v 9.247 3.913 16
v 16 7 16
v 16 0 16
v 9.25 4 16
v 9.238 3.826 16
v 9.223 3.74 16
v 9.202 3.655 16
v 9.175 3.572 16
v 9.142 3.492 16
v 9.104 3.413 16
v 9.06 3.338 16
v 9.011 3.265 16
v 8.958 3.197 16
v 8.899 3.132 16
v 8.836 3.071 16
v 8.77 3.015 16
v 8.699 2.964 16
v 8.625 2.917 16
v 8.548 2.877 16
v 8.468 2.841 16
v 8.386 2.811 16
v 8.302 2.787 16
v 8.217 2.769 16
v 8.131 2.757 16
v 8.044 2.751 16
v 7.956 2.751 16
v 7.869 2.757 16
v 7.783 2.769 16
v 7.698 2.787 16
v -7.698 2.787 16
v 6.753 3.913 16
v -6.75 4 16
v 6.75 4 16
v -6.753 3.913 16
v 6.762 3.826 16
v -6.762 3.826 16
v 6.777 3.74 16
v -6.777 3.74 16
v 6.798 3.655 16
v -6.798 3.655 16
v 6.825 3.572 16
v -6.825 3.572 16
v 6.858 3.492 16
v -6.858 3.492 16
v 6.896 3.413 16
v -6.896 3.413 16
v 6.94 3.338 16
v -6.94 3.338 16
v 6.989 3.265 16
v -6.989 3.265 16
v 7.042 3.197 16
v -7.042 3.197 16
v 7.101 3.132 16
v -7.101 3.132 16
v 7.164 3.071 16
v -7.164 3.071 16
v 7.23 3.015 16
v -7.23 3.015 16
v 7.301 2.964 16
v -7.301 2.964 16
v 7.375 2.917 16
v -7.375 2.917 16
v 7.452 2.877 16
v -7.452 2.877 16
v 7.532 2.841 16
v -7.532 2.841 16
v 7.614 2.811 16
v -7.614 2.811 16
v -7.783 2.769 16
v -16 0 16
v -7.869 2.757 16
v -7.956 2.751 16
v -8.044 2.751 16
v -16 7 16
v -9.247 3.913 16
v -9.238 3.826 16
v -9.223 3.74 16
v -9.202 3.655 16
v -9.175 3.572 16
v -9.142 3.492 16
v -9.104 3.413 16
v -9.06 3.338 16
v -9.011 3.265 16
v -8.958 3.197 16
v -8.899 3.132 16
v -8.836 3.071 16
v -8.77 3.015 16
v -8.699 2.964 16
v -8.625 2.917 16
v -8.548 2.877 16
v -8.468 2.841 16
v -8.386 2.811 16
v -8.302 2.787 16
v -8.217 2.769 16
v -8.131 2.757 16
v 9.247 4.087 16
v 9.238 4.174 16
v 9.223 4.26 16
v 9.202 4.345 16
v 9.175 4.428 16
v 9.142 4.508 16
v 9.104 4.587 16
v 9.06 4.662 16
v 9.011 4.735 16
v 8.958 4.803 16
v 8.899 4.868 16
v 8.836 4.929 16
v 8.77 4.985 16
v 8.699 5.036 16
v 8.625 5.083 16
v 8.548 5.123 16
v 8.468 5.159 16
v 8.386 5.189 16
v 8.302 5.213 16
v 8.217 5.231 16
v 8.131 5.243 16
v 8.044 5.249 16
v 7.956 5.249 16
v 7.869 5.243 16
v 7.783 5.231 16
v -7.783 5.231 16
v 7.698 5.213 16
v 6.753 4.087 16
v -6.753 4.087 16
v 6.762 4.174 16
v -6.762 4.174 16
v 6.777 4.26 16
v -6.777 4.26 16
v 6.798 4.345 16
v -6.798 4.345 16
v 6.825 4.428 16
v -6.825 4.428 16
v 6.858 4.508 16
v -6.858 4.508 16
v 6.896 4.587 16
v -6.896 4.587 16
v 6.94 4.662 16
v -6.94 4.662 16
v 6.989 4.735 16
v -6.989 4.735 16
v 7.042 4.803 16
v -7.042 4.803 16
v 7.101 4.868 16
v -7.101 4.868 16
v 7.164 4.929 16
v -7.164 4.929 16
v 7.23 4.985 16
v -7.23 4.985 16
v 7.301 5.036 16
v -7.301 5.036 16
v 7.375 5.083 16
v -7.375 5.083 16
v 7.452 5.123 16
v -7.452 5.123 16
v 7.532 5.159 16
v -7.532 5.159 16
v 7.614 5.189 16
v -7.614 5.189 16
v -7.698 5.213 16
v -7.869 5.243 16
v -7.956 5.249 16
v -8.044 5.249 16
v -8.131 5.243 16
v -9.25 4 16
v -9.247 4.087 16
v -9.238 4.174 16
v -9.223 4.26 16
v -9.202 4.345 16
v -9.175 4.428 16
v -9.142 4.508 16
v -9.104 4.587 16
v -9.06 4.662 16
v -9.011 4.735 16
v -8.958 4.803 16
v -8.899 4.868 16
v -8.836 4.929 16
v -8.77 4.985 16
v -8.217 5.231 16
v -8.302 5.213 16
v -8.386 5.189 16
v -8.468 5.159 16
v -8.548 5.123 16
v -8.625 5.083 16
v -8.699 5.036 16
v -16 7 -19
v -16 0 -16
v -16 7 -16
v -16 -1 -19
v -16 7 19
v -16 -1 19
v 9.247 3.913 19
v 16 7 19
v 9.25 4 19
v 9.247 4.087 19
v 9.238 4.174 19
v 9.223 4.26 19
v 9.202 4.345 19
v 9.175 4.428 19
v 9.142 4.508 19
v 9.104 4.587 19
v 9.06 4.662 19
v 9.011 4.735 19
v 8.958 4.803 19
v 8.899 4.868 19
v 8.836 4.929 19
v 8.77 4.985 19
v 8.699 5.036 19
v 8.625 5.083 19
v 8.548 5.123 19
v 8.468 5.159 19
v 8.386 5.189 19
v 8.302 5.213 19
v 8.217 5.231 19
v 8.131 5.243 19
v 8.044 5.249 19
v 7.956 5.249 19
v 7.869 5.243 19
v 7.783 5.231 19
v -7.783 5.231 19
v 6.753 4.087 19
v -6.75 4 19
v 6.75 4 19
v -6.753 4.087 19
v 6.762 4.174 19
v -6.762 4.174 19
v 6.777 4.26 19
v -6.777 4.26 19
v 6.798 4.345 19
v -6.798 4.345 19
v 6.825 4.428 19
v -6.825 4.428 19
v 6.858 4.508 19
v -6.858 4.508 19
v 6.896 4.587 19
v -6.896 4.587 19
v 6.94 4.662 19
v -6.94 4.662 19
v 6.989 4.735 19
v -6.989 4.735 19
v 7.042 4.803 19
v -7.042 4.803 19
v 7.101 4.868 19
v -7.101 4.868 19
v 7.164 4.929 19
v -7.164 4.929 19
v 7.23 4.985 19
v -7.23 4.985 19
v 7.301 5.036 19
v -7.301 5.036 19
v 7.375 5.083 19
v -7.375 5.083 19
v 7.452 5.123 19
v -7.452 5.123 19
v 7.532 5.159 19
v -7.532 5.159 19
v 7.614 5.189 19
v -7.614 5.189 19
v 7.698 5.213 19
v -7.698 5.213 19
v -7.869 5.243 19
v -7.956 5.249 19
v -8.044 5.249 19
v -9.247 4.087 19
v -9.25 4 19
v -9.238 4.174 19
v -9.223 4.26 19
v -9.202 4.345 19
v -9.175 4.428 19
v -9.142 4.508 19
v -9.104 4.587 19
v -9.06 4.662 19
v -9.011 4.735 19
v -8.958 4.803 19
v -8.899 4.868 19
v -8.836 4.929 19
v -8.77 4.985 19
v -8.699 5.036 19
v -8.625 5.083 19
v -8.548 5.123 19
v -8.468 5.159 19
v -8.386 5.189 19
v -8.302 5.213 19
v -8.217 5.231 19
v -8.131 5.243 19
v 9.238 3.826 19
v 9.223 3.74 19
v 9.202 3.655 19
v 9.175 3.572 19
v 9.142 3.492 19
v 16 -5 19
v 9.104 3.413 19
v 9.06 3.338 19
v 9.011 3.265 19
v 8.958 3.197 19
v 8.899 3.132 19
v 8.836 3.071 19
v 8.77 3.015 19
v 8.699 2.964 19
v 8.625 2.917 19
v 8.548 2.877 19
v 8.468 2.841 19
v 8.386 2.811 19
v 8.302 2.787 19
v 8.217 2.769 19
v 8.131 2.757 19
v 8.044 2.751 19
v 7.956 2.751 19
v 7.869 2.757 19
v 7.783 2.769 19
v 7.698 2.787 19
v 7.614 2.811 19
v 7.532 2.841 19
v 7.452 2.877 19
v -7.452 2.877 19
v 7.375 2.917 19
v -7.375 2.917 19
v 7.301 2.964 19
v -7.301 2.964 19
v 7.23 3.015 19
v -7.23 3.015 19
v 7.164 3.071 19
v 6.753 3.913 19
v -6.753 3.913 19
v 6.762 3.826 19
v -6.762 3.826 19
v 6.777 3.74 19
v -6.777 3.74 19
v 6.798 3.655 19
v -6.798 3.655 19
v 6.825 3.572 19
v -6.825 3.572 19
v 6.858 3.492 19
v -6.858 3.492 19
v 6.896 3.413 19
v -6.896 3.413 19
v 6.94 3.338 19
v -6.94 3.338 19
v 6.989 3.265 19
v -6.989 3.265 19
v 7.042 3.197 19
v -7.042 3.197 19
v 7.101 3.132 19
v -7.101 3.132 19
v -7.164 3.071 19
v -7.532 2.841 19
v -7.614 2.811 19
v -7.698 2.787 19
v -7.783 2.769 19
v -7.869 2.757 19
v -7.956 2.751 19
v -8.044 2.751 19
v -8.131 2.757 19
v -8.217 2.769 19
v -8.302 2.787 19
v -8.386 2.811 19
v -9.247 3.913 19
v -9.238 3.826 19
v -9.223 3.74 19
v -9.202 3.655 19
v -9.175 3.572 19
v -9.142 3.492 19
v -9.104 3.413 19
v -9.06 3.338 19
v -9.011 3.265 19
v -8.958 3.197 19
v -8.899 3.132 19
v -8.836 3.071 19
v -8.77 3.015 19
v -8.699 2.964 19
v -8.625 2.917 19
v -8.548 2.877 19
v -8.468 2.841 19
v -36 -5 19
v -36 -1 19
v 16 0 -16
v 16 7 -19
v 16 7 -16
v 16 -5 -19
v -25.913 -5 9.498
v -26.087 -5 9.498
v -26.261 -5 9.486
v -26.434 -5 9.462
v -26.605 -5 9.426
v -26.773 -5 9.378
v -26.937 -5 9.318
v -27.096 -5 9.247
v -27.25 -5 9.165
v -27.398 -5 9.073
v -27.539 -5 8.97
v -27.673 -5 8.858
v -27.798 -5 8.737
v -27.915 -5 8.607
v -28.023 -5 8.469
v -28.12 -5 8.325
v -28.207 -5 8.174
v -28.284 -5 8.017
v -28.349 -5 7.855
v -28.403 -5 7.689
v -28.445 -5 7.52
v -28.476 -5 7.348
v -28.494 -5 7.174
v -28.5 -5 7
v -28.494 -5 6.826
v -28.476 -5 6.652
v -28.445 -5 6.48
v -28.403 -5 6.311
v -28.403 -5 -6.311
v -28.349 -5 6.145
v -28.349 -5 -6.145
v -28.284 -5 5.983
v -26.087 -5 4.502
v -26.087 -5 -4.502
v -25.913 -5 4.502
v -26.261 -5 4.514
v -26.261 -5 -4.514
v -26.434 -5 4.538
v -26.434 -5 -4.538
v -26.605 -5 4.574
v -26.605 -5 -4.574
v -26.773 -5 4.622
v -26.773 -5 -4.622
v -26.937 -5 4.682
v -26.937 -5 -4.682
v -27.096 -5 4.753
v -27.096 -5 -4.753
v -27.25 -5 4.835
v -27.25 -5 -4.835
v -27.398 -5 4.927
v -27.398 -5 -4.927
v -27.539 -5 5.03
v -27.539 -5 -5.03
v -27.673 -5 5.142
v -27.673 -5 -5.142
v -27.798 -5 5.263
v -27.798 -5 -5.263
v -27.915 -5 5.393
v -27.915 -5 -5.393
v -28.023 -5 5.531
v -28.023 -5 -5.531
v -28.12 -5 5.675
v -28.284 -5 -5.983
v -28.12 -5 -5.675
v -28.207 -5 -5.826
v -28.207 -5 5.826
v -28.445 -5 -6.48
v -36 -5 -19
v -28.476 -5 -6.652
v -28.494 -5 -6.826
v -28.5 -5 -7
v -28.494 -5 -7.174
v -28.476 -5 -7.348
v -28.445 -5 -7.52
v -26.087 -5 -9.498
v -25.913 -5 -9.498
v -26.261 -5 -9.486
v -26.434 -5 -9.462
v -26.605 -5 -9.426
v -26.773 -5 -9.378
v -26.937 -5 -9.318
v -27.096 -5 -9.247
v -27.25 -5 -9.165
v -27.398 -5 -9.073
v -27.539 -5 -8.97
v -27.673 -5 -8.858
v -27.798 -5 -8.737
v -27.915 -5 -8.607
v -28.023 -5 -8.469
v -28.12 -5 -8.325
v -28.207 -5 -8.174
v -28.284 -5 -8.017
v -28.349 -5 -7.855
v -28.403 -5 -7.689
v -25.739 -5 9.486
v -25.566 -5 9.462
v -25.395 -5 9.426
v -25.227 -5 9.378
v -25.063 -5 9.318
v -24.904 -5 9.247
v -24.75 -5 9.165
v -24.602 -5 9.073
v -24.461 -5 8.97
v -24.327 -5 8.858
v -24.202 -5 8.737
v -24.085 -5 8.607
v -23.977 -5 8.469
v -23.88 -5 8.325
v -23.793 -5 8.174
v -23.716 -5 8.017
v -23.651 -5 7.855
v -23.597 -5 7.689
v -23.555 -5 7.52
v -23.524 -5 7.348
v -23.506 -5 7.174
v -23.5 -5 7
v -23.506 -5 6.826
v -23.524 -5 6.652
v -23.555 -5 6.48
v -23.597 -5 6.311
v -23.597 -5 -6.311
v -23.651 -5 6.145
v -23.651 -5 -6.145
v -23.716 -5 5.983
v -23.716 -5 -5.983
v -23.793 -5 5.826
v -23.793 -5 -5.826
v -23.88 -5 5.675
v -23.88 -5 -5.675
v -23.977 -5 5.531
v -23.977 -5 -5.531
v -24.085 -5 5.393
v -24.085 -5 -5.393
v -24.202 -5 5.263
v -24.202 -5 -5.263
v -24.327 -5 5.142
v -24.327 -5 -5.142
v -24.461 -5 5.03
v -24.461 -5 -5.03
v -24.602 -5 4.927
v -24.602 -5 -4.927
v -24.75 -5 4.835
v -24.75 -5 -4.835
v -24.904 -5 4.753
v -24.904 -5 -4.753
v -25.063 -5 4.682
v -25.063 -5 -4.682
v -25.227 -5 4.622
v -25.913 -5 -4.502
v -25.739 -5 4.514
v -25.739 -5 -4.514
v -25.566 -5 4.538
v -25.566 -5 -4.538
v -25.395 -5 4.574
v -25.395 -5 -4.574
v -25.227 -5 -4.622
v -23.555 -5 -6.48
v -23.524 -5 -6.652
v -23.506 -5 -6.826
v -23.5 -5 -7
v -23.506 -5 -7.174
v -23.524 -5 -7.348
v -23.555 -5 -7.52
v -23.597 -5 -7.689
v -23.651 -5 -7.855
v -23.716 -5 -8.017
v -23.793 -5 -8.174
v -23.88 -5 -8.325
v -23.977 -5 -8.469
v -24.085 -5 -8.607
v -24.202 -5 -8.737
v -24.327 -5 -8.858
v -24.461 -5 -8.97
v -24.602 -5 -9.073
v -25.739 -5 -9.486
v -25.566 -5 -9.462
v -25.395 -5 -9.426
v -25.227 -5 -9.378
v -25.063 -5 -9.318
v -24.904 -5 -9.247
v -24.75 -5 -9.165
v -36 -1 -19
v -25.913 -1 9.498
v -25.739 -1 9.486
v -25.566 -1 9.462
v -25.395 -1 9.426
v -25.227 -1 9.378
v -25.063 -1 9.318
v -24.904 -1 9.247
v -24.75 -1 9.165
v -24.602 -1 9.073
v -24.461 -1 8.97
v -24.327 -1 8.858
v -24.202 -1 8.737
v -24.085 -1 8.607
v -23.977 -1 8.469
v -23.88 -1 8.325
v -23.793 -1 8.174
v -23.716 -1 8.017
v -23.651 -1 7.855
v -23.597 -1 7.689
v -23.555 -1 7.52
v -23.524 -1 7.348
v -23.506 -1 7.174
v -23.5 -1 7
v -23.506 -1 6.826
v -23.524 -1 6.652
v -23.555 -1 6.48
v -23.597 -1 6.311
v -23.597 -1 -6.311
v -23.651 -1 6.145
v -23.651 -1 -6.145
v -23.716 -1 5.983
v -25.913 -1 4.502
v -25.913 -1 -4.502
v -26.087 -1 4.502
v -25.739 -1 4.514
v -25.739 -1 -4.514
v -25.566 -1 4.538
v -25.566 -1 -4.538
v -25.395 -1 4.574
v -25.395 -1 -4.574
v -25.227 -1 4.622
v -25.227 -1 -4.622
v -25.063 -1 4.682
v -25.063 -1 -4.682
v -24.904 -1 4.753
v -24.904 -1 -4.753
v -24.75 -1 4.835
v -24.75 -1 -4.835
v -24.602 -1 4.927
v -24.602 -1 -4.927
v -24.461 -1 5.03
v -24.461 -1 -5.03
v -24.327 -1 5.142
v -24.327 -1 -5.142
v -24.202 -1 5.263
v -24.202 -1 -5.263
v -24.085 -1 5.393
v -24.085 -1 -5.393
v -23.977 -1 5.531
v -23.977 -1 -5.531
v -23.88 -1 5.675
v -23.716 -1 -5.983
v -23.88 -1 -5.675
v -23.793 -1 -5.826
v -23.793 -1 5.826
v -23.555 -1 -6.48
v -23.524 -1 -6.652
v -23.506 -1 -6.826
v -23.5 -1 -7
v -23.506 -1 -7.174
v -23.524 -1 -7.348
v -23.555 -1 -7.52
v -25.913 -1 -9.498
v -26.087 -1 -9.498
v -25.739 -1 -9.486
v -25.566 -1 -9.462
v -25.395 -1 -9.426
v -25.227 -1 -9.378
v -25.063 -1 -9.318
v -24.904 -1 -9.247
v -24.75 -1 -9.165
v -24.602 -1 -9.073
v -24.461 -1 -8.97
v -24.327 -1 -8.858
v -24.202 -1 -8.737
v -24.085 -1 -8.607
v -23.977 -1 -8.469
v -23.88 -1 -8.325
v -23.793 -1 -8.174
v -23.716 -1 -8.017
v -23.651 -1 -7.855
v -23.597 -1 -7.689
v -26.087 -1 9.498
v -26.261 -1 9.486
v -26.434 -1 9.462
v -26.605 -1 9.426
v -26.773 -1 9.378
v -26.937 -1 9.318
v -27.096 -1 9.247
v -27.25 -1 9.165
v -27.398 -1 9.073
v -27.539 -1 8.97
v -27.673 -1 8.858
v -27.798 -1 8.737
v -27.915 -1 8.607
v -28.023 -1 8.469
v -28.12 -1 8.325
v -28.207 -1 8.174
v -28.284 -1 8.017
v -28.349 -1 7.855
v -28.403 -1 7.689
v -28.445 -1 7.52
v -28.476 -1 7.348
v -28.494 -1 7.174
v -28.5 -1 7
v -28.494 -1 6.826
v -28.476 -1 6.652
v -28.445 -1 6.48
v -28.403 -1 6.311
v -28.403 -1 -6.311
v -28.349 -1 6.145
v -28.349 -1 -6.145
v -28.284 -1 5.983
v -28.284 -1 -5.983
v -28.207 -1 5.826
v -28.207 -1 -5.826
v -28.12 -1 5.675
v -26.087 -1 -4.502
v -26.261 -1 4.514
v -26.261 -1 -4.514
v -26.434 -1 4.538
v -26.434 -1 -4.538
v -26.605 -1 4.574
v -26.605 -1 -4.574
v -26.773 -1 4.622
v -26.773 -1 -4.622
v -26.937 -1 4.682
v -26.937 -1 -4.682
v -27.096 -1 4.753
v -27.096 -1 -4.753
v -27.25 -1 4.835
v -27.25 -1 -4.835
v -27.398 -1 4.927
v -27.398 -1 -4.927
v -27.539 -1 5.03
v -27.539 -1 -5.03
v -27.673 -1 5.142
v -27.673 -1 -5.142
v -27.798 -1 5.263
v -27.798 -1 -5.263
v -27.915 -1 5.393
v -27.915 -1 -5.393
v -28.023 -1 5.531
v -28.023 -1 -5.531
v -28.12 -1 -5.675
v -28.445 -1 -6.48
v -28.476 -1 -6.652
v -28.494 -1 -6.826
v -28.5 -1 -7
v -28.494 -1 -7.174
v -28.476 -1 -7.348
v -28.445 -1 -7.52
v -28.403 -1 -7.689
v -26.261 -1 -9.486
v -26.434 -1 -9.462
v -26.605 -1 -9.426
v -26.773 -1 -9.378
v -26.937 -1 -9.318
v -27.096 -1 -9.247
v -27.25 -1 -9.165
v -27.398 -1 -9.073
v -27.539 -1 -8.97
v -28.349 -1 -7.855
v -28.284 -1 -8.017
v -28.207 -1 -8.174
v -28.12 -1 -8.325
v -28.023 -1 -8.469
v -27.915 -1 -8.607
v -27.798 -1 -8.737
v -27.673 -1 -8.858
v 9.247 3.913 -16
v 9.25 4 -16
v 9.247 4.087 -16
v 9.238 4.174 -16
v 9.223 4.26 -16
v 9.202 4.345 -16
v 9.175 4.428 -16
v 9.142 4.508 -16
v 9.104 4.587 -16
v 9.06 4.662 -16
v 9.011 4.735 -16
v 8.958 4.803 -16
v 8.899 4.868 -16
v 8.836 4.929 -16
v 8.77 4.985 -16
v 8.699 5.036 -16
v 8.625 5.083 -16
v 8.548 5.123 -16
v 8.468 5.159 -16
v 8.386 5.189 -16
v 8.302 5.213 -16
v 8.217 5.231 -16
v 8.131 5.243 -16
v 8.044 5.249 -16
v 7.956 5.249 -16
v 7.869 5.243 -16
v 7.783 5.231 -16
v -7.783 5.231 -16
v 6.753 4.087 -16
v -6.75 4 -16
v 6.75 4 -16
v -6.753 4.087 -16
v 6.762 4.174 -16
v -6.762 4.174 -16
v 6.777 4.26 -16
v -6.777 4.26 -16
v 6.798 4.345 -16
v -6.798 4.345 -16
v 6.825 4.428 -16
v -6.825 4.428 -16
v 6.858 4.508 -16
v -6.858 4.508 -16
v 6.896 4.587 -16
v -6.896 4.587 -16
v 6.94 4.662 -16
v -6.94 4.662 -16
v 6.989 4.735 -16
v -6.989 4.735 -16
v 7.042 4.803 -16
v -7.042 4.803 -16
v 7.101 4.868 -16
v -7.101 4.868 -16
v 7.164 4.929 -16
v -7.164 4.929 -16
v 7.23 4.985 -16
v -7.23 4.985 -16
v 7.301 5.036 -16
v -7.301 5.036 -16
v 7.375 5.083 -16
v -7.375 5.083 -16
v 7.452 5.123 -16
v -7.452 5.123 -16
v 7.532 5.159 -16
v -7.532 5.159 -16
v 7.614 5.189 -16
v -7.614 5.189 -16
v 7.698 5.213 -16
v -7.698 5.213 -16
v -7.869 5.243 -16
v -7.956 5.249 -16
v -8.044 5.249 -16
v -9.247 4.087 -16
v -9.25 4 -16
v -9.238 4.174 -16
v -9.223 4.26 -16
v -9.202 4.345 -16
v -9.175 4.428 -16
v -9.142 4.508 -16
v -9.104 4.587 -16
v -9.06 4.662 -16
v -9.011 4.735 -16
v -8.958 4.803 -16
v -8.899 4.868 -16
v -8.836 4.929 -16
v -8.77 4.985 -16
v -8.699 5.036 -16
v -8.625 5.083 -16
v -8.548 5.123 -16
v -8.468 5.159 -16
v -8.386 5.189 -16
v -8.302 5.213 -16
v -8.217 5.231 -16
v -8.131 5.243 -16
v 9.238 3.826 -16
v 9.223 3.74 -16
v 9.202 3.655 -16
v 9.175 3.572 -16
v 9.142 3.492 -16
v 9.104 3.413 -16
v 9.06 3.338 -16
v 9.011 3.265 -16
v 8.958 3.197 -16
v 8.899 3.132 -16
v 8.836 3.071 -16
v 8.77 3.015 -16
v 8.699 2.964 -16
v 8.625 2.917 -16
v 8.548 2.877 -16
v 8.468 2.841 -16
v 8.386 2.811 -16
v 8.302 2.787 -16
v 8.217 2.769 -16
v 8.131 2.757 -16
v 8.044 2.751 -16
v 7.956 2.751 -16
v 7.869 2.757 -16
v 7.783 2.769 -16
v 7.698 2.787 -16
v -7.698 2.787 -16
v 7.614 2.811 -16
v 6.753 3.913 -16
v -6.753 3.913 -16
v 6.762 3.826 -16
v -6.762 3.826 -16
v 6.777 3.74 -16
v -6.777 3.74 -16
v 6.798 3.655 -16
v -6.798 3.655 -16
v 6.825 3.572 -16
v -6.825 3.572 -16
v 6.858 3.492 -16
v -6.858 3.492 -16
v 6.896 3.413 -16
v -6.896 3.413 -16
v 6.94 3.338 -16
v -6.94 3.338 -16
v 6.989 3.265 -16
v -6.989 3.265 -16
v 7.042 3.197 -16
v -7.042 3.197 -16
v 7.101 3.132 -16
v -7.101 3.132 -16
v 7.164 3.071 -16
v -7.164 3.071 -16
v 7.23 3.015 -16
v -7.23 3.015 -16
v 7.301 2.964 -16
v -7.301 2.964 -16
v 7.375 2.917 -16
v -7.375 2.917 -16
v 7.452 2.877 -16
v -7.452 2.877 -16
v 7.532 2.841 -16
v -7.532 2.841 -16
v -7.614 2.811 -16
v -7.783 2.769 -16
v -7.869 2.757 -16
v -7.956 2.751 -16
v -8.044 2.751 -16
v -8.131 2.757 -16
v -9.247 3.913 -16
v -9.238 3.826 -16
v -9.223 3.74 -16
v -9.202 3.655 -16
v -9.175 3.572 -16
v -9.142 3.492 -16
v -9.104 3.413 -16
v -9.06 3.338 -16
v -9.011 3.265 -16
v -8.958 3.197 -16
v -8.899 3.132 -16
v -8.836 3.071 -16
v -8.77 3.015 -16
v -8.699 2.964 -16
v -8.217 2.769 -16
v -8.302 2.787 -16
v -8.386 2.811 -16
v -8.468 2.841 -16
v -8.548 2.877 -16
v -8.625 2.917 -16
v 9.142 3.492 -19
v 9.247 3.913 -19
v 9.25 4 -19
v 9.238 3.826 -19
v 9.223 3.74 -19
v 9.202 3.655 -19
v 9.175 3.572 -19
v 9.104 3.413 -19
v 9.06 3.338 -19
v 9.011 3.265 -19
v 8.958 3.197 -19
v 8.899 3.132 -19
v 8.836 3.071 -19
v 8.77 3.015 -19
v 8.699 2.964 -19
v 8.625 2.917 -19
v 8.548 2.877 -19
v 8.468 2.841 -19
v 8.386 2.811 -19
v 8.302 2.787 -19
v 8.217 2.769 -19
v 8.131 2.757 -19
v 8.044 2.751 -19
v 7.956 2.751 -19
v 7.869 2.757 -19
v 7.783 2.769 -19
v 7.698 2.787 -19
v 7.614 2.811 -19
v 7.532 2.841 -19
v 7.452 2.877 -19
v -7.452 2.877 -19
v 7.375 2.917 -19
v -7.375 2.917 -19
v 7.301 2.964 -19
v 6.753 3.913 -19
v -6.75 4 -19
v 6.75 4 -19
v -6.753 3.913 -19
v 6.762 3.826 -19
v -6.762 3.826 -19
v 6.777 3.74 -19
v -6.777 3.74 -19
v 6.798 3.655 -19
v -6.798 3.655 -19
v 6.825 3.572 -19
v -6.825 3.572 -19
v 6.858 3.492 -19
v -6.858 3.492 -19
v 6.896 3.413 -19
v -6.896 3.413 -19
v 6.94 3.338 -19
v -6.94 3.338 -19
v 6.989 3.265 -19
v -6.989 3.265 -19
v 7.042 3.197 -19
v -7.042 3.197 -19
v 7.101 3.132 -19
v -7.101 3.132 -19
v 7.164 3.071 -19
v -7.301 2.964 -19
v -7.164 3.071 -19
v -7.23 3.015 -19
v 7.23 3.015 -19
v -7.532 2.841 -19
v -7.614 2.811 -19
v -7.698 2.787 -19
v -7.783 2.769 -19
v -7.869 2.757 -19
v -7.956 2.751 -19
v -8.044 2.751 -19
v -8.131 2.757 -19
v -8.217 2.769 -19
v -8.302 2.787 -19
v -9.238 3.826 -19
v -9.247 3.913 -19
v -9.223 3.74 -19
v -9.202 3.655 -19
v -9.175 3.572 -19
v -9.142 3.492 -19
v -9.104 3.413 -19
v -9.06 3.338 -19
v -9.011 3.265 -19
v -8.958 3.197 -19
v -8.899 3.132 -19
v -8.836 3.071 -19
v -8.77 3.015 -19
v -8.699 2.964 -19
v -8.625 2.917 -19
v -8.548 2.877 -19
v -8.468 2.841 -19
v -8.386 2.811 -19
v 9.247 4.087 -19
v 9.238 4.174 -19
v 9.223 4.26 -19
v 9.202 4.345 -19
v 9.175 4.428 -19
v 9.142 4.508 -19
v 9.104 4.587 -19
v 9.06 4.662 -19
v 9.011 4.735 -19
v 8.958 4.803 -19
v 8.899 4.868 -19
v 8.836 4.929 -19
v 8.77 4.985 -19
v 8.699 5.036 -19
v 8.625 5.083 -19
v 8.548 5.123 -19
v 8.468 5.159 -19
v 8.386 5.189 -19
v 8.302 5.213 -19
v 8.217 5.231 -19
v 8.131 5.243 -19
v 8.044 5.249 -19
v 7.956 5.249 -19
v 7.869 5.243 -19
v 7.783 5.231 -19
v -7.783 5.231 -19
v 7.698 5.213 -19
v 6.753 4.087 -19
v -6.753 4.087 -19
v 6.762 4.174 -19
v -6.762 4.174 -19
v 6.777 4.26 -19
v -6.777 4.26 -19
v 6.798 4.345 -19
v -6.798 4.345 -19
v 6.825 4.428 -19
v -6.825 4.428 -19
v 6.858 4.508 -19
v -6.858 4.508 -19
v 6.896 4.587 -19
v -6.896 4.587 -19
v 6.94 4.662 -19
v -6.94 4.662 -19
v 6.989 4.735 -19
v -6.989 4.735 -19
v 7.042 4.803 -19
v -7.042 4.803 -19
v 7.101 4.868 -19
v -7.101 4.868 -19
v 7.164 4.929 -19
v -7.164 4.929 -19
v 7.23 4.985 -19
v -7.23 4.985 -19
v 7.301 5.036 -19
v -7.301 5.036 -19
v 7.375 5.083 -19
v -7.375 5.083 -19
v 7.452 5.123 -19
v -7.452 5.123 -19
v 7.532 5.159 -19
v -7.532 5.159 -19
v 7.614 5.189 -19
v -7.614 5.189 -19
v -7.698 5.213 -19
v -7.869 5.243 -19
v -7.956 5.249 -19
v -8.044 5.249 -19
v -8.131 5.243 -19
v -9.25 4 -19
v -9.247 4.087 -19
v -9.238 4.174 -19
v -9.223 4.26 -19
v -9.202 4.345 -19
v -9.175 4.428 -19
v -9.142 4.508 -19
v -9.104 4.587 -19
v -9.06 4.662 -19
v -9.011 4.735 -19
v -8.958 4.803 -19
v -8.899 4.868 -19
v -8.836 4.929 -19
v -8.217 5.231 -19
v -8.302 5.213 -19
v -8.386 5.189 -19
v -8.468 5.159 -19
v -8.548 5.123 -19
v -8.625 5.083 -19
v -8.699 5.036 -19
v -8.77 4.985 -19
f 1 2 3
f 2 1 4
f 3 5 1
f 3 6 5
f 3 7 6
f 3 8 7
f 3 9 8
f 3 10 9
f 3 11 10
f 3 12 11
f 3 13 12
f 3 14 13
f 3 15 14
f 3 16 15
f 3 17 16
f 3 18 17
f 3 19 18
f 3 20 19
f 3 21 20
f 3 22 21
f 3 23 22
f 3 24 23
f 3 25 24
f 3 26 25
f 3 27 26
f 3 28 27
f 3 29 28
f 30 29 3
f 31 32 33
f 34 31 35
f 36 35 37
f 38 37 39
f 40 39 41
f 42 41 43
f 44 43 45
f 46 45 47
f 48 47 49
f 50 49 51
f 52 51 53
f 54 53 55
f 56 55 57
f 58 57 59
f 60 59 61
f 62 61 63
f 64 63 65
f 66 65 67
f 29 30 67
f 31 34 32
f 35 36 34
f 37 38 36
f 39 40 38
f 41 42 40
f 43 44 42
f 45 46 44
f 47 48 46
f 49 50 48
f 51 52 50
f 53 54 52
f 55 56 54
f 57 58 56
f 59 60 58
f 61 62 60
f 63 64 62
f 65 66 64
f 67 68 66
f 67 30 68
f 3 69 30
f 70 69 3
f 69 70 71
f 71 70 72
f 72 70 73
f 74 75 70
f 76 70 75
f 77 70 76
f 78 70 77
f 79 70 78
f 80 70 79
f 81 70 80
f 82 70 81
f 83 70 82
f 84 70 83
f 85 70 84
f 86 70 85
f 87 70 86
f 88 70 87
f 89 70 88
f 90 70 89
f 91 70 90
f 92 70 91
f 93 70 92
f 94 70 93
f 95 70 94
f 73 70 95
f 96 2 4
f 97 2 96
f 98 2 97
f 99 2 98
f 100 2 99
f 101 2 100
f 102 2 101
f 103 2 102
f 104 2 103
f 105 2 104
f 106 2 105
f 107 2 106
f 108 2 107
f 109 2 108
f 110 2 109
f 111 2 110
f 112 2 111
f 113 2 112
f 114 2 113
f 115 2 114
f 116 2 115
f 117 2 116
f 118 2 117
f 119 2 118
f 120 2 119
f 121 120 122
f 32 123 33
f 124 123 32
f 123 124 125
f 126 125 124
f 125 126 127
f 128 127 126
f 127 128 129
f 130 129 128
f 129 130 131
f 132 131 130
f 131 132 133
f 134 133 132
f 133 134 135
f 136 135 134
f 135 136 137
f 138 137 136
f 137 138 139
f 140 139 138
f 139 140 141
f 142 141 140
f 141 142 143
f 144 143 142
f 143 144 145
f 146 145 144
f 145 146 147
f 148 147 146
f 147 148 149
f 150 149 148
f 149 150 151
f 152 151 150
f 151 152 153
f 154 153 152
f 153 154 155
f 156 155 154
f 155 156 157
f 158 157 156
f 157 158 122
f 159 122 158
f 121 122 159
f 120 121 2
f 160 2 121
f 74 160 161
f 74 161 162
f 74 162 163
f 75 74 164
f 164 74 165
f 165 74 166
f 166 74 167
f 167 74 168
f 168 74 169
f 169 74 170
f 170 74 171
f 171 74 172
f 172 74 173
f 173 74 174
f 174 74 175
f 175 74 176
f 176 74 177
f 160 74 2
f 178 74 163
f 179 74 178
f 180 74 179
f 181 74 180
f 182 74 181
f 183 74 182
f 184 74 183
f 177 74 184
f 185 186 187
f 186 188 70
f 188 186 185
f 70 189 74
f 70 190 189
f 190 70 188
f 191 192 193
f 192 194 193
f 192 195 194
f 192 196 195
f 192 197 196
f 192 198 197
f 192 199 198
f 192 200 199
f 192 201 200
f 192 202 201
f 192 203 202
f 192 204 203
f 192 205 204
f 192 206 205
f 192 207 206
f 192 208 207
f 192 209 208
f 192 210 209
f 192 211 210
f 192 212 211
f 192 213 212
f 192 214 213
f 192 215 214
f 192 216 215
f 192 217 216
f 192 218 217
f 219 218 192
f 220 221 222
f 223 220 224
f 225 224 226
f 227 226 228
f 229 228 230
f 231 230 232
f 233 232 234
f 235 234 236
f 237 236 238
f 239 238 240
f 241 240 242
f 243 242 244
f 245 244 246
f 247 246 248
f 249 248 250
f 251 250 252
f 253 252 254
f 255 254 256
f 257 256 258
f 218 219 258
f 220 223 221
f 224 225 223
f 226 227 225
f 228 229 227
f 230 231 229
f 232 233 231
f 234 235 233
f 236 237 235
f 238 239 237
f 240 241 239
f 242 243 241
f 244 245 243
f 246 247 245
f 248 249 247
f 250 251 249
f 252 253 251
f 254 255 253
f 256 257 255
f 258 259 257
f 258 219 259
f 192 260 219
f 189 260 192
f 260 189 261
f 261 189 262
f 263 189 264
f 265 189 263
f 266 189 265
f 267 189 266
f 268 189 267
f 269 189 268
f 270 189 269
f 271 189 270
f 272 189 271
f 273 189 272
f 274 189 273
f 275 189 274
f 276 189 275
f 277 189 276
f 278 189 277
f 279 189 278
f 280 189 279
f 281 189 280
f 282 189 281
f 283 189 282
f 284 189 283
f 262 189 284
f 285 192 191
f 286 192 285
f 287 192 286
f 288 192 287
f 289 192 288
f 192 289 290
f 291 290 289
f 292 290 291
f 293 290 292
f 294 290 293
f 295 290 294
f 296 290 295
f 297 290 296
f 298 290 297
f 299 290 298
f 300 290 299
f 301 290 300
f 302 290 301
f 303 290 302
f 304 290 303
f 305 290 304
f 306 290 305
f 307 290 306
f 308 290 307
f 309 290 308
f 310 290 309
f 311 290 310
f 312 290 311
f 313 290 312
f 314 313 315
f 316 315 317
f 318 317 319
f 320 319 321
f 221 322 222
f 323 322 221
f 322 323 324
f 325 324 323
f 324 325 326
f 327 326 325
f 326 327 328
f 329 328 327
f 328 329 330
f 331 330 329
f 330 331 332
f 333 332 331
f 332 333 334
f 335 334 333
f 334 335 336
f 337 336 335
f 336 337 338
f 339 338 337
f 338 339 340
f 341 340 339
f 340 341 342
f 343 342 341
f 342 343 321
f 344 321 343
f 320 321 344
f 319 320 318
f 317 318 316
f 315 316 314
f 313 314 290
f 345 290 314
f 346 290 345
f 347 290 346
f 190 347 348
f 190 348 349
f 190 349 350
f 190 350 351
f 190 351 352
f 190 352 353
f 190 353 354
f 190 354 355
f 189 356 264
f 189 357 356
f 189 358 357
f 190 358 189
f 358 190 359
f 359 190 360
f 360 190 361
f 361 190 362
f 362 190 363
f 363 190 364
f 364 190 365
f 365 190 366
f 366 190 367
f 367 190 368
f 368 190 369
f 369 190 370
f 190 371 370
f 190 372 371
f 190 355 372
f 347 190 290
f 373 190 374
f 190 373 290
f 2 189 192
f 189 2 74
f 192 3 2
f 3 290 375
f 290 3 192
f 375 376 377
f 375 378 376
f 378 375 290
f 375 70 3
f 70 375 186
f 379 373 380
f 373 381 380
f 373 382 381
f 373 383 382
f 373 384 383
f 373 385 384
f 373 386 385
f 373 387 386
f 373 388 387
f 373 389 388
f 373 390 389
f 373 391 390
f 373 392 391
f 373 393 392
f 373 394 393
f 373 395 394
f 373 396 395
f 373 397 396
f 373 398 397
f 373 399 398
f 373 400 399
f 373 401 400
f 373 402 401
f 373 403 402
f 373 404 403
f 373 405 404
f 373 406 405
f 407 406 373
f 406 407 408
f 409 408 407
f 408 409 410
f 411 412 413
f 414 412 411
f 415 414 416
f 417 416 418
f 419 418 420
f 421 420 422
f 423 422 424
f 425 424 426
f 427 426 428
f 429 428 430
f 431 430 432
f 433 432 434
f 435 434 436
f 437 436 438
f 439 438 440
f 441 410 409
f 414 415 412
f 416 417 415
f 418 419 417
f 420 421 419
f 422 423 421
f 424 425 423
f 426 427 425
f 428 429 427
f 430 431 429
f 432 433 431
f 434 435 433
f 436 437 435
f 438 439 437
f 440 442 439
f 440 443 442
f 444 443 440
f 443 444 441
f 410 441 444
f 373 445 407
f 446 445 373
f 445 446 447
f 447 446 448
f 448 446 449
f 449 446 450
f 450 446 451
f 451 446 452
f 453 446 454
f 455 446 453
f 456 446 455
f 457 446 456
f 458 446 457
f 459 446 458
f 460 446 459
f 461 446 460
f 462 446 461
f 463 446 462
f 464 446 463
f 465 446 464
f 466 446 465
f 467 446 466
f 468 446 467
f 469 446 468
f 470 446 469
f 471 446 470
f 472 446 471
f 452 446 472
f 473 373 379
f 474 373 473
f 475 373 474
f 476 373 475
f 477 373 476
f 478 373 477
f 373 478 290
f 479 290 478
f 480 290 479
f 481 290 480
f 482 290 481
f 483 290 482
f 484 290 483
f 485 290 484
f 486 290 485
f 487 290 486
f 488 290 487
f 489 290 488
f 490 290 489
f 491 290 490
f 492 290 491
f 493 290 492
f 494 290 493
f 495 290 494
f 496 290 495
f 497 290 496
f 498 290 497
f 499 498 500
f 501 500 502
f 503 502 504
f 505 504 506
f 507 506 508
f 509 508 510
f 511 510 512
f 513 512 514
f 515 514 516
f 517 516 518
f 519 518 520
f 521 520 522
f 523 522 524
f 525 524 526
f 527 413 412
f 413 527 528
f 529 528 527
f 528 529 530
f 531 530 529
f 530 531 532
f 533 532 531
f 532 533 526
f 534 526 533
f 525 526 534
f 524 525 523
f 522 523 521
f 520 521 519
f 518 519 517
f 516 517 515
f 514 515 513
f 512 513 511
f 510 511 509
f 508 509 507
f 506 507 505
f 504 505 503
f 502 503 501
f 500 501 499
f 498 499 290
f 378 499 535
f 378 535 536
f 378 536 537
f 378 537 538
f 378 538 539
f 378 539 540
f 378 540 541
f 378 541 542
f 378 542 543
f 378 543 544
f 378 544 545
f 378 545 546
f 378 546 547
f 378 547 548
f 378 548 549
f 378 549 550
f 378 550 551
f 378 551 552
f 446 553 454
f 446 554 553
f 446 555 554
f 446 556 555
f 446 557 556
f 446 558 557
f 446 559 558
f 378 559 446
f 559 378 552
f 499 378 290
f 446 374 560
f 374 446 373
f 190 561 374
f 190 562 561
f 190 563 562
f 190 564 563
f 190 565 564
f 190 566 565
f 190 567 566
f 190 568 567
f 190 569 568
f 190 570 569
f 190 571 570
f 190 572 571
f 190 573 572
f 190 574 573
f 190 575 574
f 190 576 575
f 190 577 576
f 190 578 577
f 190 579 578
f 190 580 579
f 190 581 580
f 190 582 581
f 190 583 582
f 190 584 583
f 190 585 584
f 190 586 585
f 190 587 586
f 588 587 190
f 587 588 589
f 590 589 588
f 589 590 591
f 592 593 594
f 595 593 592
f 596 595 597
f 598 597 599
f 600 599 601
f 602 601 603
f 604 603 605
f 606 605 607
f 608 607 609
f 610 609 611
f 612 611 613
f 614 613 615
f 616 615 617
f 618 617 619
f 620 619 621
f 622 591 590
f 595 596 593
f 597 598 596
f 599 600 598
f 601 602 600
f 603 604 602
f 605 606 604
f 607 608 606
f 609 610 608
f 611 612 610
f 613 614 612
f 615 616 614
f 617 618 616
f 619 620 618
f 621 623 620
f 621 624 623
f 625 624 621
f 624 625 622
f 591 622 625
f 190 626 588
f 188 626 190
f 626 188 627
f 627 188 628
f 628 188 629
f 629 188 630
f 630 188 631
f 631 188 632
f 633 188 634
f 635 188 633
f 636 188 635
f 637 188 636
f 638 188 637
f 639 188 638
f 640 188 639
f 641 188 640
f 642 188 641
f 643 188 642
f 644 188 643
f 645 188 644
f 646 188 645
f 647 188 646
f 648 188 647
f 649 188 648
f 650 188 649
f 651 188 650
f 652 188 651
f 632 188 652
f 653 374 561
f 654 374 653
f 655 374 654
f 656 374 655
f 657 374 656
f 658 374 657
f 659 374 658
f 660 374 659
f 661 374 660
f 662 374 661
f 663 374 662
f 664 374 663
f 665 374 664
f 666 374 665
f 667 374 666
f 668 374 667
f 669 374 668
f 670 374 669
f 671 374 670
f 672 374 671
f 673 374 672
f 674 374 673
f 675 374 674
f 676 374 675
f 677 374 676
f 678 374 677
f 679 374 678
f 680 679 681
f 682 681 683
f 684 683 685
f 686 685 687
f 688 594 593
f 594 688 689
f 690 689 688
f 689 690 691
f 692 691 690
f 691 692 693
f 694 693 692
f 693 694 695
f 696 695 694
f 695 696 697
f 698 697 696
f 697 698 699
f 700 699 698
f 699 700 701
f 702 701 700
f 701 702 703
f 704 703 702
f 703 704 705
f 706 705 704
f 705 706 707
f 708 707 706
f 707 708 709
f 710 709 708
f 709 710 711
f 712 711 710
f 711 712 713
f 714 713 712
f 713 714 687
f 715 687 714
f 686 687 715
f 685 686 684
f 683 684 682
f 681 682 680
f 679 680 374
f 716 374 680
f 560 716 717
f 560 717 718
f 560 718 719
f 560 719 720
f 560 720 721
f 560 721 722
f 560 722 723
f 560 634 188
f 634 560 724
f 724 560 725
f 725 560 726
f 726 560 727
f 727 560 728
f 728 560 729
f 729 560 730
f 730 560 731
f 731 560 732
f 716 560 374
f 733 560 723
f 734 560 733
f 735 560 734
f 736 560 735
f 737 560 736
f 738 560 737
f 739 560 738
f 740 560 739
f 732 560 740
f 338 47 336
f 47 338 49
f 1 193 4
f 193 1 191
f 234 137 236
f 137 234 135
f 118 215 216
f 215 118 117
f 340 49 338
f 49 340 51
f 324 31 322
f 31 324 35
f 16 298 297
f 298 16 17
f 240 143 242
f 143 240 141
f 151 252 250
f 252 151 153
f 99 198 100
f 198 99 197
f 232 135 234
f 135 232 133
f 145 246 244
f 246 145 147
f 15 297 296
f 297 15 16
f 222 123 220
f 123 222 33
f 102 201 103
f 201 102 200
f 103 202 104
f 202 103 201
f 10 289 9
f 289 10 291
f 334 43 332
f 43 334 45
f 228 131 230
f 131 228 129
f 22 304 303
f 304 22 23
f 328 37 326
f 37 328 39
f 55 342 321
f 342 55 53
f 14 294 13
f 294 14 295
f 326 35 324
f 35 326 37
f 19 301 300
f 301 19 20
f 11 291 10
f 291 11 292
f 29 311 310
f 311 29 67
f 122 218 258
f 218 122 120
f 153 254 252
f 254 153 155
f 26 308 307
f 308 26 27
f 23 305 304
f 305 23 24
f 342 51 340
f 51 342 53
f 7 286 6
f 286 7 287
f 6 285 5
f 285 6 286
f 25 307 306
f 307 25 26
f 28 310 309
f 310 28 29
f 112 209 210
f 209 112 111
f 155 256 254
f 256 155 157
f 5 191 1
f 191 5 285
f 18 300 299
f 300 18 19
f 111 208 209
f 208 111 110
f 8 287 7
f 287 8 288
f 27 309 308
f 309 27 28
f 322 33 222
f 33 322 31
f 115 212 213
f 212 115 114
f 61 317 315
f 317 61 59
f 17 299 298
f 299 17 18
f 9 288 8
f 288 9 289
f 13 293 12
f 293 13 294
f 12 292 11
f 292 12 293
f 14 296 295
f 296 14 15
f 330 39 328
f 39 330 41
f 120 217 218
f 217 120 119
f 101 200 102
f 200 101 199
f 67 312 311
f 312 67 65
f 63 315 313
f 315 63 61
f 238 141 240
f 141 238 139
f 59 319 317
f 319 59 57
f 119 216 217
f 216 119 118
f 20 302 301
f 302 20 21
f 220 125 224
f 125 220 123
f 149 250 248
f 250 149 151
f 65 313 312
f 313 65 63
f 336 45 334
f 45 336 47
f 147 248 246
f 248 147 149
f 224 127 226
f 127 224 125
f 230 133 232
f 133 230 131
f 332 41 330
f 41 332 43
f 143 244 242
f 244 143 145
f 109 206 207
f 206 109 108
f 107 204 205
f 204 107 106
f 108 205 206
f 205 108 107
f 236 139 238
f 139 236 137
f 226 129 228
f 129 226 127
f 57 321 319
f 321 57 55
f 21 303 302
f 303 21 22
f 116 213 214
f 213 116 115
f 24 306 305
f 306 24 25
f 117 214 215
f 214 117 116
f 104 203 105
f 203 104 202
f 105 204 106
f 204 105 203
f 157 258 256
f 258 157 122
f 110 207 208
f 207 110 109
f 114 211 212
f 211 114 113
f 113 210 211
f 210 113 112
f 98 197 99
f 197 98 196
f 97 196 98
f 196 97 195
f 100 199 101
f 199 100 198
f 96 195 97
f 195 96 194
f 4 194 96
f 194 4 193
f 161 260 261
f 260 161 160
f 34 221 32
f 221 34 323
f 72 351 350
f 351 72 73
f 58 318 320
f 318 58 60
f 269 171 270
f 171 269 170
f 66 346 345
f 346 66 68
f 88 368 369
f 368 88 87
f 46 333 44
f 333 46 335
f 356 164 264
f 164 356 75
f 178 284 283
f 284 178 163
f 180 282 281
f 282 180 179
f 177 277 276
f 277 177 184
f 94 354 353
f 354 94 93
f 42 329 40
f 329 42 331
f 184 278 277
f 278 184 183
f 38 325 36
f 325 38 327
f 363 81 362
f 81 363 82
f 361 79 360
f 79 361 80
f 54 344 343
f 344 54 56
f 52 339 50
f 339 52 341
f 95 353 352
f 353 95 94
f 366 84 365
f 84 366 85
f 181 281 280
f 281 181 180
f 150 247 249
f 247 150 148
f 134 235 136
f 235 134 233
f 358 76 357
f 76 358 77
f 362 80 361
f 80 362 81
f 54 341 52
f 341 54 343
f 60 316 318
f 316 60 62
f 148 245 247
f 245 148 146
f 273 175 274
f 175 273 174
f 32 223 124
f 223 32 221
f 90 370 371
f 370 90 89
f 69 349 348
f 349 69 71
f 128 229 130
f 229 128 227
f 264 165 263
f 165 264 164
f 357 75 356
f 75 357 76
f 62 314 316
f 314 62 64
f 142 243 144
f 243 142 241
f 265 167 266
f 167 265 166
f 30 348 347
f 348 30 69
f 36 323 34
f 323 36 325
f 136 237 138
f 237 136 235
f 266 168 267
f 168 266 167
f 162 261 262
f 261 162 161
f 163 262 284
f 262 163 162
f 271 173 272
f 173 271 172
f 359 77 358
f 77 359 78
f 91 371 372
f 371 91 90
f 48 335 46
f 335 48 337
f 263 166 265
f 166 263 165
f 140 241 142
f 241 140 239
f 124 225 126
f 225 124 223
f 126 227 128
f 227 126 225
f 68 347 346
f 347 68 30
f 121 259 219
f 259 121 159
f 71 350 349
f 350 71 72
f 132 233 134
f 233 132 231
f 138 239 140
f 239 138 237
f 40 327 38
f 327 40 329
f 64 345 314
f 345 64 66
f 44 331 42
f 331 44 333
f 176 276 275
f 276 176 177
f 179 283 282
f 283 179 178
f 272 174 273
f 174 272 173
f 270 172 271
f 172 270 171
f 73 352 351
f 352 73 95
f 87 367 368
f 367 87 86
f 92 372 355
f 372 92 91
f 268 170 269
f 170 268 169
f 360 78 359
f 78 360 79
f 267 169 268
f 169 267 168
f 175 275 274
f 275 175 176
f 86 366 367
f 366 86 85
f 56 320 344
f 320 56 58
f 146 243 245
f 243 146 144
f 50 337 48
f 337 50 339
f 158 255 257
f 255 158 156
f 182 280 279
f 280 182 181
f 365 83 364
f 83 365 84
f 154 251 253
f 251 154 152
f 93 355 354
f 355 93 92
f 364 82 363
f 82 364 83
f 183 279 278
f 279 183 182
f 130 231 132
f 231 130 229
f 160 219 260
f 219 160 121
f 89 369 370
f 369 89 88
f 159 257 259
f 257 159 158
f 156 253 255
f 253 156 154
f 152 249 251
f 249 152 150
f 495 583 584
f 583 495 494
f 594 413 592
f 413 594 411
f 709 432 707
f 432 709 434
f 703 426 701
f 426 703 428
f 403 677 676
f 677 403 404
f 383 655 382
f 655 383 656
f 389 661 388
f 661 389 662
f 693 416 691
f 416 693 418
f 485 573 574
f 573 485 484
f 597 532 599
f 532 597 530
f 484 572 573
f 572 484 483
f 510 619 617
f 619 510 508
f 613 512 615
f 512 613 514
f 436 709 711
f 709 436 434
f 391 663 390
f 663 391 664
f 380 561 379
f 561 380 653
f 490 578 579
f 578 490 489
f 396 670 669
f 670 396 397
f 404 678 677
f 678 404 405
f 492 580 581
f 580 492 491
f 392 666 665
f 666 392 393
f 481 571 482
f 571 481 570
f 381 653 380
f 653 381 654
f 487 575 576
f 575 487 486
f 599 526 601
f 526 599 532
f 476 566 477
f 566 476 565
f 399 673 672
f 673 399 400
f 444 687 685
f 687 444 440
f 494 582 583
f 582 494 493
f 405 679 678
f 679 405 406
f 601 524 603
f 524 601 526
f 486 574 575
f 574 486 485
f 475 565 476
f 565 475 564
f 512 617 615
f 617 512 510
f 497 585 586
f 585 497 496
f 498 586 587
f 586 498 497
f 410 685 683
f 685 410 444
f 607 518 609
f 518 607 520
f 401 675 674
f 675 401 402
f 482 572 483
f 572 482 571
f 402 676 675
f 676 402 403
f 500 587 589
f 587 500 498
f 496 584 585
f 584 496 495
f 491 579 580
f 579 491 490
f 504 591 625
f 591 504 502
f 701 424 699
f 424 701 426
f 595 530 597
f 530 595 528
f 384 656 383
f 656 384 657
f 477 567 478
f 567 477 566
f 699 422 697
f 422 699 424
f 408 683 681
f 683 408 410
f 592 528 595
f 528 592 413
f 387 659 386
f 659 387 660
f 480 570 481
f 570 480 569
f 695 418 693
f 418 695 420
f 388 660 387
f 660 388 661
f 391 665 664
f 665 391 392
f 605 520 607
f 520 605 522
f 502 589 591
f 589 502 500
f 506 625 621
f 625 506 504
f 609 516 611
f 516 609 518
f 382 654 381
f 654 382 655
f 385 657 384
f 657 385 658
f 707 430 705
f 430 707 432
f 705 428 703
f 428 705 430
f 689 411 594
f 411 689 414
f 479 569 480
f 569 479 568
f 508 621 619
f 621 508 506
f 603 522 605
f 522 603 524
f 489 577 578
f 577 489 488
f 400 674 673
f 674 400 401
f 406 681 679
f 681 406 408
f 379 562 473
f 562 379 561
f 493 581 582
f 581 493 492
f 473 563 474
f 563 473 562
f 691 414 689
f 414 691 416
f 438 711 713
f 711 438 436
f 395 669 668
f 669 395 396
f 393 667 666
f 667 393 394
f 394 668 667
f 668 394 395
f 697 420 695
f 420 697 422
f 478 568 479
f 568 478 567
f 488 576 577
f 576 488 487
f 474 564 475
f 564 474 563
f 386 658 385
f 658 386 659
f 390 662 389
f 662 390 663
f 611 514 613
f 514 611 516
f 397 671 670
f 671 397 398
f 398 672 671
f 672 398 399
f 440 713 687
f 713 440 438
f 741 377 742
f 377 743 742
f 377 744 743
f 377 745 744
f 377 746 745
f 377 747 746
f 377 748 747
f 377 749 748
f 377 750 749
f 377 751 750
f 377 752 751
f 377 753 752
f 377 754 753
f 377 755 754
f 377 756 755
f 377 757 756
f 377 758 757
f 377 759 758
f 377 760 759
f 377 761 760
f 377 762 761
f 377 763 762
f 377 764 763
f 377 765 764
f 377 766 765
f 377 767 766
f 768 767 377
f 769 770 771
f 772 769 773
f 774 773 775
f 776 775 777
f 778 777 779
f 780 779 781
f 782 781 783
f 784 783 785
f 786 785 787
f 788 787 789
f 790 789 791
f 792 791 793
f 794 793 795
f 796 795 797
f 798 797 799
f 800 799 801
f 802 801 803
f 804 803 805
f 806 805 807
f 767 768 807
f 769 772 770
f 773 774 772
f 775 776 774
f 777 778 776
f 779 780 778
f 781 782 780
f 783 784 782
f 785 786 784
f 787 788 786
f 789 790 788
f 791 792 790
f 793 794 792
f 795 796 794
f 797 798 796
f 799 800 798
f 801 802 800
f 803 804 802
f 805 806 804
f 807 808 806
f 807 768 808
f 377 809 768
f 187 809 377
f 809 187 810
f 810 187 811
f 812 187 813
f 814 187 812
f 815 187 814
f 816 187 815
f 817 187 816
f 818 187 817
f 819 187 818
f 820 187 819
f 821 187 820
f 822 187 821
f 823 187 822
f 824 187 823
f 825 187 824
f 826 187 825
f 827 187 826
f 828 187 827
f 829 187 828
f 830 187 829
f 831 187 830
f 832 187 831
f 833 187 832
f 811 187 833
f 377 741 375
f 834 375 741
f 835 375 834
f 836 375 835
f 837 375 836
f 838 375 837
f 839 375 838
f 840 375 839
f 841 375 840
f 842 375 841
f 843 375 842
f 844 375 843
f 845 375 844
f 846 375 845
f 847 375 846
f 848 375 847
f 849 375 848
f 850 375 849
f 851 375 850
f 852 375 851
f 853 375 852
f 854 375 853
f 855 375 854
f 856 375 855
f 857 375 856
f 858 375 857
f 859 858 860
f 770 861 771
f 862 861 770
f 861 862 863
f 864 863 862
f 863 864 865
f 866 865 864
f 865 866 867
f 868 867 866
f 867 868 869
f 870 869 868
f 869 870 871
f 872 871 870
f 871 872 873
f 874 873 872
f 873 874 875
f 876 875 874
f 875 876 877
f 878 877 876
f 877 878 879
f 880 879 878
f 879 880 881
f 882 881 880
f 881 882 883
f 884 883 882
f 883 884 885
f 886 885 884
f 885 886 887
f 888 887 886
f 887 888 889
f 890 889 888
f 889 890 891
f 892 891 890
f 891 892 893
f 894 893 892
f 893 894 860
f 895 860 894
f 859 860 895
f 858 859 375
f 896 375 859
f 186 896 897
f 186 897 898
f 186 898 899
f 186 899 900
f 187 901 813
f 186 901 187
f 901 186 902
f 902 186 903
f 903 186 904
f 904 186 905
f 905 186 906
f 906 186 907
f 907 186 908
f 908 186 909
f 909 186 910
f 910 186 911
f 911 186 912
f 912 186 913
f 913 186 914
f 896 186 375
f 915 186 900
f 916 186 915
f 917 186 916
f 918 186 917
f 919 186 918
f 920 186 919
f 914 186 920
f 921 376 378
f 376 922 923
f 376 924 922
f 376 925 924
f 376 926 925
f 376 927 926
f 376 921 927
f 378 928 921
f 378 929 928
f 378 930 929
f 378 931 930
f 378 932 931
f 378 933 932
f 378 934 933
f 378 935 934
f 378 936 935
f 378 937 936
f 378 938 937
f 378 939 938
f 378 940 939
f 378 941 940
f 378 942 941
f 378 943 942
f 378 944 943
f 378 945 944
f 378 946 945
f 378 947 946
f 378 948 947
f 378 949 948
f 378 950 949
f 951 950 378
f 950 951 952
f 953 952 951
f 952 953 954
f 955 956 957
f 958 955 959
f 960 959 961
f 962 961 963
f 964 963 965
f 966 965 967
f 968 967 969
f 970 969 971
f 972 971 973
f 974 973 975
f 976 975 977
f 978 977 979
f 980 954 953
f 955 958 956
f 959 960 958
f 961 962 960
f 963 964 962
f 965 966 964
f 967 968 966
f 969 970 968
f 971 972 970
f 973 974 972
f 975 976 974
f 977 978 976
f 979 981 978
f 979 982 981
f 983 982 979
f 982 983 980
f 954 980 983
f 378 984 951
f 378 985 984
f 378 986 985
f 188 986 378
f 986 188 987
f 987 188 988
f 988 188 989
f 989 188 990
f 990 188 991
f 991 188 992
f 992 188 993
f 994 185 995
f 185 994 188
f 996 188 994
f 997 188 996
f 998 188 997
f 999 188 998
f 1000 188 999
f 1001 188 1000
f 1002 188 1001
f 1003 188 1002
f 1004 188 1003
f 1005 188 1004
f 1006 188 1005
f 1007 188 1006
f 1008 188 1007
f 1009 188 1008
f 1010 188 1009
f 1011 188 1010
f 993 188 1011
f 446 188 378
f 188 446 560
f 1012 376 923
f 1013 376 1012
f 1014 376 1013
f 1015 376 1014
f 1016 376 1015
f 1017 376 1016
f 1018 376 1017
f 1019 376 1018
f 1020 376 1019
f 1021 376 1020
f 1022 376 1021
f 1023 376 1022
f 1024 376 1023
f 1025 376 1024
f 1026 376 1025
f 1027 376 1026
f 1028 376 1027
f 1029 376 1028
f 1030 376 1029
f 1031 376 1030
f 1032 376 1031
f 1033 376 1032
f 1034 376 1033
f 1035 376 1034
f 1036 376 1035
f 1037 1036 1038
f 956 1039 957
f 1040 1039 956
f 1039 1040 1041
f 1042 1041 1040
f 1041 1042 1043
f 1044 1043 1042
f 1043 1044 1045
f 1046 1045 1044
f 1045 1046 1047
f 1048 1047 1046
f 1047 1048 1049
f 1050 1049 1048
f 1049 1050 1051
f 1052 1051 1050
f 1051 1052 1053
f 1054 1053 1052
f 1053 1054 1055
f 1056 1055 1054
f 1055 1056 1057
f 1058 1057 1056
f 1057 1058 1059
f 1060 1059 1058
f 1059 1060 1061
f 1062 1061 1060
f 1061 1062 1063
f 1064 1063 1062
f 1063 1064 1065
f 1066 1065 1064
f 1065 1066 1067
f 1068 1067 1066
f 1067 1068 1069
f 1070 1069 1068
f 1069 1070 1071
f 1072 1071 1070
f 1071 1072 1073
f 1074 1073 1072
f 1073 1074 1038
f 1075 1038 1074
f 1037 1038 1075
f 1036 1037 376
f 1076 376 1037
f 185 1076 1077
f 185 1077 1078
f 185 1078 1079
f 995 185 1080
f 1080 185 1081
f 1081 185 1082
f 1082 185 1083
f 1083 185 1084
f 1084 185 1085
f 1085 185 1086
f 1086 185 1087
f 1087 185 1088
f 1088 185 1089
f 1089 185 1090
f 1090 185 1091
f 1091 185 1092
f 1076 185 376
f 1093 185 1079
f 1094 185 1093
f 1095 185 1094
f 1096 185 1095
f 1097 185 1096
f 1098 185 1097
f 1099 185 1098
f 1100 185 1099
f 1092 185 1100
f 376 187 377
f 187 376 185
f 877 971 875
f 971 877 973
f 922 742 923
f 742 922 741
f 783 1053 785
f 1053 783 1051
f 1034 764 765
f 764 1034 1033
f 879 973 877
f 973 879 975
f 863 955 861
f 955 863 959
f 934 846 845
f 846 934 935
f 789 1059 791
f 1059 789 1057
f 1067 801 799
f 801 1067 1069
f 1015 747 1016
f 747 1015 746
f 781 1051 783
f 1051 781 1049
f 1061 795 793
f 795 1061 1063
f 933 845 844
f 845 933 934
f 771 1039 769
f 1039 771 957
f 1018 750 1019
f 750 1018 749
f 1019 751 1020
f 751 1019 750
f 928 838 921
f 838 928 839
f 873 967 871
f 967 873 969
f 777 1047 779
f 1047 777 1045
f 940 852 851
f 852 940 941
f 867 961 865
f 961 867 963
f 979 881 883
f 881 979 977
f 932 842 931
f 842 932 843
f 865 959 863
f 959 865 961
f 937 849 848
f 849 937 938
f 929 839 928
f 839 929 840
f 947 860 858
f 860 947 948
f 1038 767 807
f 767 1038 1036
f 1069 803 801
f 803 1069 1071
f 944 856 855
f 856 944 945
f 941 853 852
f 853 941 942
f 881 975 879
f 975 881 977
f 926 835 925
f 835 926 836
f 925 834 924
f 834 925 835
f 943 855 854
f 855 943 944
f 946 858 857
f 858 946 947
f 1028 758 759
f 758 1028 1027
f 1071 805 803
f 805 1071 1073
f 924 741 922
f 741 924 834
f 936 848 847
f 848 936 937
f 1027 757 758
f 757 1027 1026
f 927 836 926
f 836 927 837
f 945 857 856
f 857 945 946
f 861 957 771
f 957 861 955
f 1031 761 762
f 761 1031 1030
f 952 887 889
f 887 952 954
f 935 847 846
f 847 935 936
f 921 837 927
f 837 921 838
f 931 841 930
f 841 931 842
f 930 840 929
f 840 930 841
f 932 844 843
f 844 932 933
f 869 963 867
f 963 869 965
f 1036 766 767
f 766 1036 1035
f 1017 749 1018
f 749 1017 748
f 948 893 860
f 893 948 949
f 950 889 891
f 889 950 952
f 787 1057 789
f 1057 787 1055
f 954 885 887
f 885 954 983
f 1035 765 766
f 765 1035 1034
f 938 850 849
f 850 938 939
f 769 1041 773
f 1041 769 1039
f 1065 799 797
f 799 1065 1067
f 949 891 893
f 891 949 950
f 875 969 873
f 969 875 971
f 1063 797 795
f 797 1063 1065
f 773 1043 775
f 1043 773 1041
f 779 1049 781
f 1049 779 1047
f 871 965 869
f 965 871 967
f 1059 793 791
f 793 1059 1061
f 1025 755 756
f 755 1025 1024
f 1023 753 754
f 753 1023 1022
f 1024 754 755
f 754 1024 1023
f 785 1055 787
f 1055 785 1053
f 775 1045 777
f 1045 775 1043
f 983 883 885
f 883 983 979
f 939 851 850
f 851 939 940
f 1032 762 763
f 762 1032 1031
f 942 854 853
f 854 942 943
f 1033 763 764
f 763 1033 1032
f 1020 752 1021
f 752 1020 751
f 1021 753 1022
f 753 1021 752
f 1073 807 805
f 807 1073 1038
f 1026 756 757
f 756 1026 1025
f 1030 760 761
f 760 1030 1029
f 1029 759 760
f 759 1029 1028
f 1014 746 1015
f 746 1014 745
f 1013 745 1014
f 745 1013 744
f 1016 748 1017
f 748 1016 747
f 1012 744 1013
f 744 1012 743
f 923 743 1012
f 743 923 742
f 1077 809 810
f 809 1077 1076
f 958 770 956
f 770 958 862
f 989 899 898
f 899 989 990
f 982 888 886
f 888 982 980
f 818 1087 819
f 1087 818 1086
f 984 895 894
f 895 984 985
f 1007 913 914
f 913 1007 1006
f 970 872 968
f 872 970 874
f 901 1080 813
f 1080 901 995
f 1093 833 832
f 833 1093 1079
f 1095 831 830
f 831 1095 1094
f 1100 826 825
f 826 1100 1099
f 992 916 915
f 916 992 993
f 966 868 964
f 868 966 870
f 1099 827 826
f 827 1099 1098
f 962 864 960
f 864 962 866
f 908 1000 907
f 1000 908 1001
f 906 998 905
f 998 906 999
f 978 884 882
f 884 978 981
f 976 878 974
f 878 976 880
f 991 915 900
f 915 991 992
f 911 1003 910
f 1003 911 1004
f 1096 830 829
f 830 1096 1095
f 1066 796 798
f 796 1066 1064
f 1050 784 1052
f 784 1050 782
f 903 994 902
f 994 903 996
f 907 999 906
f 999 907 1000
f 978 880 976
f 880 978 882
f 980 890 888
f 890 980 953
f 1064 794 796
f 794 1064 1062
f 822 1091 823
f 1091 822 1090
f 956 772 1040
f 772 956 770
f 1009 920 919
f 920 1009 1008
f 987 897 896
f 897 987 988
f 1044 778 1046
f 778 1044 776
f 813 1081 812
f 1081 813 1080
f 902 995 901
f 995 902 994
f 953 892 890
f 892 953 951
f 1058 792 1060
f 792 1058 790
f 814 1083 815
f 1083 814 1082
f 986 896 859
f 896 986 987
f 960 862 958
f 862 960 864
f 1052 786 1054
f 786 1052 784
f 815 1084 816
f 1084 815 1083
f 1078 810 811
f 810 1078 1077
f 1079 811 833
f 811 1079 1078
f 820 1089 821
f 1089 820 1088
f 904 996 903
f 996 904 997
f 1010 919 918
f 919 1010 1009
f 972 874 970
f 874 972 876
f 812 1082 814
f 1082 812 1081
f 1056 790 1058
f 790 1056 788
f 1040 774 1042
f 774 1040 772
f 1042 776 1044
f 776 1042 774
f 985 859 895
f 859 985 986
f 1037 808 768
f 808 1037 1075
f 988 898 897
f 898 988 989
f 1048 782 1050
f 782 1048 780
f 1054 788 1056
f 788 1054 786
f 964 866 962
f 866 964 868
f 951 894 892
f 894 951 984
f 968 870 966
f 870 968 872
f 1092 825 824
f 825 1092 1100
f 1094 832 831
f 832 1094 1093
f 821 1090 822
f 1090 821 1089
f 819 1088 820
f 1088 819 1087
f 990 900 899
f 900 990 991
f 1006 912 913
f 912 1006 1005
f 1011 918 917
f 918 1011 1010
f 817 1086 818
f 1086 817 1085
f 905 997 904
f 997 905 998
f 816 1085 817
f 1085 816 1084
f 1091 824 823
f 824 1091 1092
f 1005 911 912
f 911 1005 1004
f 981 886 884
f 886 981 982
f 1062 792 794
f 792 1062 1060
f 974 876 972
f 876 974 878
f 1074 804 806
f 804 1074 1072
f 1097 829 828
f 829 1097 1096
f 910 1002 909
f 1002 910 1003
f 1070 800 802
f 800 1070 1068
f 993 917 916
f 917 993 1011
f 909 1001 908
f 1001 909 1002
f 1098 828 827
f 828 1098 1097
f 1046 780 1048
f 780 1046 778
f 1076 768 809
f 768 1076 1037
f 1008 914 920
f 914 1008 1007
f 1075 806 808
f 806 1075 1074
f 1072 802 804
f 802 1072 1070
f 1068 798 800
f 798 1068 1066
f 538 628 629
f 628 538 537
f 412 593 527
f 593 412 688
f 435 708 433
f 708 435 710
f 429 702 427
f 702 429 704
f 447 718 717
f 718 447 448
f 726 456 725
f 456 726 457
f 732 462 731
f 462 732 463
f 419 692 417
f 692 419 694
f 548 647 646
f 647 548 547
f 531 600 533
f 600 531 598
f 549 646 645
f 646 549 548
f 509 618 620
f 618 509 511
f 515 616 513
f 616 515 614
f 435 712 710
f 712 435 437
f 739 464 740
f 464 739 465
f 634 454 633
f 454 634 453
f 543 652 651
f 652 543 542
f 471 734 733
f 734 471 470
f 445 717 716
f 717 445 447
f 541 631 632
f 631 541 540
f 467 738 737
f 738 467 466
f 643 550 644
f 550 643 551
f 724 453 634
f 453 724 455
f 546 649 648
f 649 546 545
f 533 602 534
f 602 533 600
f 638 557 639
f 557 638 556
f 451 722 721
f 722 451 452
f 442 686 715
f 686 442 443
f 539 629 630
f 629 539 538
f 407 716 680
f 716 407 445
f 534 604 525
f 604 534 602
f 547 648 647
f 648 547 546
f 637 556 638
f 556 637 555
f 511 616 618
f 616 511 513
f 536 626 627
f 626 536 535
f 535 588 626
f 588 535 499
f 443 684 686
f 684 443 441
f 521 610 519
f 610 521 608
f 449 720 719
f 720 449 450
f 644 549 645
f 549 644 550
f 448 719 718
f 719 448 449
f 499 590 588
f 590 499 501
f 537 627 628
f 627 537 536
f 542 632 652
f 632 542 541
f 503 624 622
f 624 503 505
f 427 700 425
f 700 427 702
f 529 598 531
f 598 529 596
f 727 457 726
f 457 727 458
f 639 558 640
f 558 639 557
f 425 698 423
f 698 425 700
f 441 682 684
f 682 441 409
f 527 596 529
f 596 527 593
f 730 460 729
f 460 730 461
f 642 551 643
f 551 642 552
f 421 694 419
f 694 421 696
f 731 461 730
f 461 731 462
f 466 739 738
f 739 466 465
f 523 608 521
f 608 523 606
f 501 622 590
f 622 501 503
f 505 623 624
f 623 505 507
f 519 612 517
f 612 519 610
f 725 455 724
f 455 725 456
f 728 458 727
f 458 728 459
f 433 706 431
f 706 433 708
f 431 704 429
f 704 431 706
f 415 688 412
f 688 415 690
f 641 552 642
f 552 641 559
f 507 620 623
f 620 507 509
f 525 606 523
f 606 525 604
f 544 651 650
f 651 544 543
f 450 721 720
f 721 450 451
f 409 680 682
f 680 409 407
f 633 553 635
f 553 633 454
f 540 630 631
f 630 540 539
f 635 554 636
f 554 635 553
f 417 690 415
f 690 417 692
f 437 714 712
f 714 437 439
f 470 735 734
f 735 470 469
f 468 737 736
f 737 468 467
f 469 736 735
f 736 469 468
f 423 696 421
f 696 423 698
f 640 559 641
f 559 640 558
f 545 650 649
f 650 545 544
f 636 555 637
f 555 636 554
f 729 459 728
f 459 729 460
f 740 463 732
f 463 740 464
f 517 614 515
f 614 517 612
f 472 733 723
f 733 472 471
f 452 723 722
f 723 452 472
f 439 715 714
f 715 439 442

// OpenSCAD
module base() {
    difference(){
        union() {
            translate([0,3.5,-3]) linear_extrude(3,true) square([32,7], true);
            color("red") translate([0,-2.5,-19]) linear_extrude(19,true)square([32,5],true);
            color("green") translate([-26,-3,-19]) linear_extrude(19,true) square([20,4],true);
        }
        translate([8,4,-7]) linear_extrude(9,true) circle(d=2.5,$fn=90);
        translate([-8,4,-7]) linear_extrude(9,true) circle(d=2.5,$fn=90);
        translate([-26,-0,-12]) rotate(90,[1,0,0]) linear_extrude(9,true) circle(d=5,$fn=90);

    }
}
translate([0,0,19])
union() {
base();
mirror([0,0,1]) translate([0,0,38]) base();
}
